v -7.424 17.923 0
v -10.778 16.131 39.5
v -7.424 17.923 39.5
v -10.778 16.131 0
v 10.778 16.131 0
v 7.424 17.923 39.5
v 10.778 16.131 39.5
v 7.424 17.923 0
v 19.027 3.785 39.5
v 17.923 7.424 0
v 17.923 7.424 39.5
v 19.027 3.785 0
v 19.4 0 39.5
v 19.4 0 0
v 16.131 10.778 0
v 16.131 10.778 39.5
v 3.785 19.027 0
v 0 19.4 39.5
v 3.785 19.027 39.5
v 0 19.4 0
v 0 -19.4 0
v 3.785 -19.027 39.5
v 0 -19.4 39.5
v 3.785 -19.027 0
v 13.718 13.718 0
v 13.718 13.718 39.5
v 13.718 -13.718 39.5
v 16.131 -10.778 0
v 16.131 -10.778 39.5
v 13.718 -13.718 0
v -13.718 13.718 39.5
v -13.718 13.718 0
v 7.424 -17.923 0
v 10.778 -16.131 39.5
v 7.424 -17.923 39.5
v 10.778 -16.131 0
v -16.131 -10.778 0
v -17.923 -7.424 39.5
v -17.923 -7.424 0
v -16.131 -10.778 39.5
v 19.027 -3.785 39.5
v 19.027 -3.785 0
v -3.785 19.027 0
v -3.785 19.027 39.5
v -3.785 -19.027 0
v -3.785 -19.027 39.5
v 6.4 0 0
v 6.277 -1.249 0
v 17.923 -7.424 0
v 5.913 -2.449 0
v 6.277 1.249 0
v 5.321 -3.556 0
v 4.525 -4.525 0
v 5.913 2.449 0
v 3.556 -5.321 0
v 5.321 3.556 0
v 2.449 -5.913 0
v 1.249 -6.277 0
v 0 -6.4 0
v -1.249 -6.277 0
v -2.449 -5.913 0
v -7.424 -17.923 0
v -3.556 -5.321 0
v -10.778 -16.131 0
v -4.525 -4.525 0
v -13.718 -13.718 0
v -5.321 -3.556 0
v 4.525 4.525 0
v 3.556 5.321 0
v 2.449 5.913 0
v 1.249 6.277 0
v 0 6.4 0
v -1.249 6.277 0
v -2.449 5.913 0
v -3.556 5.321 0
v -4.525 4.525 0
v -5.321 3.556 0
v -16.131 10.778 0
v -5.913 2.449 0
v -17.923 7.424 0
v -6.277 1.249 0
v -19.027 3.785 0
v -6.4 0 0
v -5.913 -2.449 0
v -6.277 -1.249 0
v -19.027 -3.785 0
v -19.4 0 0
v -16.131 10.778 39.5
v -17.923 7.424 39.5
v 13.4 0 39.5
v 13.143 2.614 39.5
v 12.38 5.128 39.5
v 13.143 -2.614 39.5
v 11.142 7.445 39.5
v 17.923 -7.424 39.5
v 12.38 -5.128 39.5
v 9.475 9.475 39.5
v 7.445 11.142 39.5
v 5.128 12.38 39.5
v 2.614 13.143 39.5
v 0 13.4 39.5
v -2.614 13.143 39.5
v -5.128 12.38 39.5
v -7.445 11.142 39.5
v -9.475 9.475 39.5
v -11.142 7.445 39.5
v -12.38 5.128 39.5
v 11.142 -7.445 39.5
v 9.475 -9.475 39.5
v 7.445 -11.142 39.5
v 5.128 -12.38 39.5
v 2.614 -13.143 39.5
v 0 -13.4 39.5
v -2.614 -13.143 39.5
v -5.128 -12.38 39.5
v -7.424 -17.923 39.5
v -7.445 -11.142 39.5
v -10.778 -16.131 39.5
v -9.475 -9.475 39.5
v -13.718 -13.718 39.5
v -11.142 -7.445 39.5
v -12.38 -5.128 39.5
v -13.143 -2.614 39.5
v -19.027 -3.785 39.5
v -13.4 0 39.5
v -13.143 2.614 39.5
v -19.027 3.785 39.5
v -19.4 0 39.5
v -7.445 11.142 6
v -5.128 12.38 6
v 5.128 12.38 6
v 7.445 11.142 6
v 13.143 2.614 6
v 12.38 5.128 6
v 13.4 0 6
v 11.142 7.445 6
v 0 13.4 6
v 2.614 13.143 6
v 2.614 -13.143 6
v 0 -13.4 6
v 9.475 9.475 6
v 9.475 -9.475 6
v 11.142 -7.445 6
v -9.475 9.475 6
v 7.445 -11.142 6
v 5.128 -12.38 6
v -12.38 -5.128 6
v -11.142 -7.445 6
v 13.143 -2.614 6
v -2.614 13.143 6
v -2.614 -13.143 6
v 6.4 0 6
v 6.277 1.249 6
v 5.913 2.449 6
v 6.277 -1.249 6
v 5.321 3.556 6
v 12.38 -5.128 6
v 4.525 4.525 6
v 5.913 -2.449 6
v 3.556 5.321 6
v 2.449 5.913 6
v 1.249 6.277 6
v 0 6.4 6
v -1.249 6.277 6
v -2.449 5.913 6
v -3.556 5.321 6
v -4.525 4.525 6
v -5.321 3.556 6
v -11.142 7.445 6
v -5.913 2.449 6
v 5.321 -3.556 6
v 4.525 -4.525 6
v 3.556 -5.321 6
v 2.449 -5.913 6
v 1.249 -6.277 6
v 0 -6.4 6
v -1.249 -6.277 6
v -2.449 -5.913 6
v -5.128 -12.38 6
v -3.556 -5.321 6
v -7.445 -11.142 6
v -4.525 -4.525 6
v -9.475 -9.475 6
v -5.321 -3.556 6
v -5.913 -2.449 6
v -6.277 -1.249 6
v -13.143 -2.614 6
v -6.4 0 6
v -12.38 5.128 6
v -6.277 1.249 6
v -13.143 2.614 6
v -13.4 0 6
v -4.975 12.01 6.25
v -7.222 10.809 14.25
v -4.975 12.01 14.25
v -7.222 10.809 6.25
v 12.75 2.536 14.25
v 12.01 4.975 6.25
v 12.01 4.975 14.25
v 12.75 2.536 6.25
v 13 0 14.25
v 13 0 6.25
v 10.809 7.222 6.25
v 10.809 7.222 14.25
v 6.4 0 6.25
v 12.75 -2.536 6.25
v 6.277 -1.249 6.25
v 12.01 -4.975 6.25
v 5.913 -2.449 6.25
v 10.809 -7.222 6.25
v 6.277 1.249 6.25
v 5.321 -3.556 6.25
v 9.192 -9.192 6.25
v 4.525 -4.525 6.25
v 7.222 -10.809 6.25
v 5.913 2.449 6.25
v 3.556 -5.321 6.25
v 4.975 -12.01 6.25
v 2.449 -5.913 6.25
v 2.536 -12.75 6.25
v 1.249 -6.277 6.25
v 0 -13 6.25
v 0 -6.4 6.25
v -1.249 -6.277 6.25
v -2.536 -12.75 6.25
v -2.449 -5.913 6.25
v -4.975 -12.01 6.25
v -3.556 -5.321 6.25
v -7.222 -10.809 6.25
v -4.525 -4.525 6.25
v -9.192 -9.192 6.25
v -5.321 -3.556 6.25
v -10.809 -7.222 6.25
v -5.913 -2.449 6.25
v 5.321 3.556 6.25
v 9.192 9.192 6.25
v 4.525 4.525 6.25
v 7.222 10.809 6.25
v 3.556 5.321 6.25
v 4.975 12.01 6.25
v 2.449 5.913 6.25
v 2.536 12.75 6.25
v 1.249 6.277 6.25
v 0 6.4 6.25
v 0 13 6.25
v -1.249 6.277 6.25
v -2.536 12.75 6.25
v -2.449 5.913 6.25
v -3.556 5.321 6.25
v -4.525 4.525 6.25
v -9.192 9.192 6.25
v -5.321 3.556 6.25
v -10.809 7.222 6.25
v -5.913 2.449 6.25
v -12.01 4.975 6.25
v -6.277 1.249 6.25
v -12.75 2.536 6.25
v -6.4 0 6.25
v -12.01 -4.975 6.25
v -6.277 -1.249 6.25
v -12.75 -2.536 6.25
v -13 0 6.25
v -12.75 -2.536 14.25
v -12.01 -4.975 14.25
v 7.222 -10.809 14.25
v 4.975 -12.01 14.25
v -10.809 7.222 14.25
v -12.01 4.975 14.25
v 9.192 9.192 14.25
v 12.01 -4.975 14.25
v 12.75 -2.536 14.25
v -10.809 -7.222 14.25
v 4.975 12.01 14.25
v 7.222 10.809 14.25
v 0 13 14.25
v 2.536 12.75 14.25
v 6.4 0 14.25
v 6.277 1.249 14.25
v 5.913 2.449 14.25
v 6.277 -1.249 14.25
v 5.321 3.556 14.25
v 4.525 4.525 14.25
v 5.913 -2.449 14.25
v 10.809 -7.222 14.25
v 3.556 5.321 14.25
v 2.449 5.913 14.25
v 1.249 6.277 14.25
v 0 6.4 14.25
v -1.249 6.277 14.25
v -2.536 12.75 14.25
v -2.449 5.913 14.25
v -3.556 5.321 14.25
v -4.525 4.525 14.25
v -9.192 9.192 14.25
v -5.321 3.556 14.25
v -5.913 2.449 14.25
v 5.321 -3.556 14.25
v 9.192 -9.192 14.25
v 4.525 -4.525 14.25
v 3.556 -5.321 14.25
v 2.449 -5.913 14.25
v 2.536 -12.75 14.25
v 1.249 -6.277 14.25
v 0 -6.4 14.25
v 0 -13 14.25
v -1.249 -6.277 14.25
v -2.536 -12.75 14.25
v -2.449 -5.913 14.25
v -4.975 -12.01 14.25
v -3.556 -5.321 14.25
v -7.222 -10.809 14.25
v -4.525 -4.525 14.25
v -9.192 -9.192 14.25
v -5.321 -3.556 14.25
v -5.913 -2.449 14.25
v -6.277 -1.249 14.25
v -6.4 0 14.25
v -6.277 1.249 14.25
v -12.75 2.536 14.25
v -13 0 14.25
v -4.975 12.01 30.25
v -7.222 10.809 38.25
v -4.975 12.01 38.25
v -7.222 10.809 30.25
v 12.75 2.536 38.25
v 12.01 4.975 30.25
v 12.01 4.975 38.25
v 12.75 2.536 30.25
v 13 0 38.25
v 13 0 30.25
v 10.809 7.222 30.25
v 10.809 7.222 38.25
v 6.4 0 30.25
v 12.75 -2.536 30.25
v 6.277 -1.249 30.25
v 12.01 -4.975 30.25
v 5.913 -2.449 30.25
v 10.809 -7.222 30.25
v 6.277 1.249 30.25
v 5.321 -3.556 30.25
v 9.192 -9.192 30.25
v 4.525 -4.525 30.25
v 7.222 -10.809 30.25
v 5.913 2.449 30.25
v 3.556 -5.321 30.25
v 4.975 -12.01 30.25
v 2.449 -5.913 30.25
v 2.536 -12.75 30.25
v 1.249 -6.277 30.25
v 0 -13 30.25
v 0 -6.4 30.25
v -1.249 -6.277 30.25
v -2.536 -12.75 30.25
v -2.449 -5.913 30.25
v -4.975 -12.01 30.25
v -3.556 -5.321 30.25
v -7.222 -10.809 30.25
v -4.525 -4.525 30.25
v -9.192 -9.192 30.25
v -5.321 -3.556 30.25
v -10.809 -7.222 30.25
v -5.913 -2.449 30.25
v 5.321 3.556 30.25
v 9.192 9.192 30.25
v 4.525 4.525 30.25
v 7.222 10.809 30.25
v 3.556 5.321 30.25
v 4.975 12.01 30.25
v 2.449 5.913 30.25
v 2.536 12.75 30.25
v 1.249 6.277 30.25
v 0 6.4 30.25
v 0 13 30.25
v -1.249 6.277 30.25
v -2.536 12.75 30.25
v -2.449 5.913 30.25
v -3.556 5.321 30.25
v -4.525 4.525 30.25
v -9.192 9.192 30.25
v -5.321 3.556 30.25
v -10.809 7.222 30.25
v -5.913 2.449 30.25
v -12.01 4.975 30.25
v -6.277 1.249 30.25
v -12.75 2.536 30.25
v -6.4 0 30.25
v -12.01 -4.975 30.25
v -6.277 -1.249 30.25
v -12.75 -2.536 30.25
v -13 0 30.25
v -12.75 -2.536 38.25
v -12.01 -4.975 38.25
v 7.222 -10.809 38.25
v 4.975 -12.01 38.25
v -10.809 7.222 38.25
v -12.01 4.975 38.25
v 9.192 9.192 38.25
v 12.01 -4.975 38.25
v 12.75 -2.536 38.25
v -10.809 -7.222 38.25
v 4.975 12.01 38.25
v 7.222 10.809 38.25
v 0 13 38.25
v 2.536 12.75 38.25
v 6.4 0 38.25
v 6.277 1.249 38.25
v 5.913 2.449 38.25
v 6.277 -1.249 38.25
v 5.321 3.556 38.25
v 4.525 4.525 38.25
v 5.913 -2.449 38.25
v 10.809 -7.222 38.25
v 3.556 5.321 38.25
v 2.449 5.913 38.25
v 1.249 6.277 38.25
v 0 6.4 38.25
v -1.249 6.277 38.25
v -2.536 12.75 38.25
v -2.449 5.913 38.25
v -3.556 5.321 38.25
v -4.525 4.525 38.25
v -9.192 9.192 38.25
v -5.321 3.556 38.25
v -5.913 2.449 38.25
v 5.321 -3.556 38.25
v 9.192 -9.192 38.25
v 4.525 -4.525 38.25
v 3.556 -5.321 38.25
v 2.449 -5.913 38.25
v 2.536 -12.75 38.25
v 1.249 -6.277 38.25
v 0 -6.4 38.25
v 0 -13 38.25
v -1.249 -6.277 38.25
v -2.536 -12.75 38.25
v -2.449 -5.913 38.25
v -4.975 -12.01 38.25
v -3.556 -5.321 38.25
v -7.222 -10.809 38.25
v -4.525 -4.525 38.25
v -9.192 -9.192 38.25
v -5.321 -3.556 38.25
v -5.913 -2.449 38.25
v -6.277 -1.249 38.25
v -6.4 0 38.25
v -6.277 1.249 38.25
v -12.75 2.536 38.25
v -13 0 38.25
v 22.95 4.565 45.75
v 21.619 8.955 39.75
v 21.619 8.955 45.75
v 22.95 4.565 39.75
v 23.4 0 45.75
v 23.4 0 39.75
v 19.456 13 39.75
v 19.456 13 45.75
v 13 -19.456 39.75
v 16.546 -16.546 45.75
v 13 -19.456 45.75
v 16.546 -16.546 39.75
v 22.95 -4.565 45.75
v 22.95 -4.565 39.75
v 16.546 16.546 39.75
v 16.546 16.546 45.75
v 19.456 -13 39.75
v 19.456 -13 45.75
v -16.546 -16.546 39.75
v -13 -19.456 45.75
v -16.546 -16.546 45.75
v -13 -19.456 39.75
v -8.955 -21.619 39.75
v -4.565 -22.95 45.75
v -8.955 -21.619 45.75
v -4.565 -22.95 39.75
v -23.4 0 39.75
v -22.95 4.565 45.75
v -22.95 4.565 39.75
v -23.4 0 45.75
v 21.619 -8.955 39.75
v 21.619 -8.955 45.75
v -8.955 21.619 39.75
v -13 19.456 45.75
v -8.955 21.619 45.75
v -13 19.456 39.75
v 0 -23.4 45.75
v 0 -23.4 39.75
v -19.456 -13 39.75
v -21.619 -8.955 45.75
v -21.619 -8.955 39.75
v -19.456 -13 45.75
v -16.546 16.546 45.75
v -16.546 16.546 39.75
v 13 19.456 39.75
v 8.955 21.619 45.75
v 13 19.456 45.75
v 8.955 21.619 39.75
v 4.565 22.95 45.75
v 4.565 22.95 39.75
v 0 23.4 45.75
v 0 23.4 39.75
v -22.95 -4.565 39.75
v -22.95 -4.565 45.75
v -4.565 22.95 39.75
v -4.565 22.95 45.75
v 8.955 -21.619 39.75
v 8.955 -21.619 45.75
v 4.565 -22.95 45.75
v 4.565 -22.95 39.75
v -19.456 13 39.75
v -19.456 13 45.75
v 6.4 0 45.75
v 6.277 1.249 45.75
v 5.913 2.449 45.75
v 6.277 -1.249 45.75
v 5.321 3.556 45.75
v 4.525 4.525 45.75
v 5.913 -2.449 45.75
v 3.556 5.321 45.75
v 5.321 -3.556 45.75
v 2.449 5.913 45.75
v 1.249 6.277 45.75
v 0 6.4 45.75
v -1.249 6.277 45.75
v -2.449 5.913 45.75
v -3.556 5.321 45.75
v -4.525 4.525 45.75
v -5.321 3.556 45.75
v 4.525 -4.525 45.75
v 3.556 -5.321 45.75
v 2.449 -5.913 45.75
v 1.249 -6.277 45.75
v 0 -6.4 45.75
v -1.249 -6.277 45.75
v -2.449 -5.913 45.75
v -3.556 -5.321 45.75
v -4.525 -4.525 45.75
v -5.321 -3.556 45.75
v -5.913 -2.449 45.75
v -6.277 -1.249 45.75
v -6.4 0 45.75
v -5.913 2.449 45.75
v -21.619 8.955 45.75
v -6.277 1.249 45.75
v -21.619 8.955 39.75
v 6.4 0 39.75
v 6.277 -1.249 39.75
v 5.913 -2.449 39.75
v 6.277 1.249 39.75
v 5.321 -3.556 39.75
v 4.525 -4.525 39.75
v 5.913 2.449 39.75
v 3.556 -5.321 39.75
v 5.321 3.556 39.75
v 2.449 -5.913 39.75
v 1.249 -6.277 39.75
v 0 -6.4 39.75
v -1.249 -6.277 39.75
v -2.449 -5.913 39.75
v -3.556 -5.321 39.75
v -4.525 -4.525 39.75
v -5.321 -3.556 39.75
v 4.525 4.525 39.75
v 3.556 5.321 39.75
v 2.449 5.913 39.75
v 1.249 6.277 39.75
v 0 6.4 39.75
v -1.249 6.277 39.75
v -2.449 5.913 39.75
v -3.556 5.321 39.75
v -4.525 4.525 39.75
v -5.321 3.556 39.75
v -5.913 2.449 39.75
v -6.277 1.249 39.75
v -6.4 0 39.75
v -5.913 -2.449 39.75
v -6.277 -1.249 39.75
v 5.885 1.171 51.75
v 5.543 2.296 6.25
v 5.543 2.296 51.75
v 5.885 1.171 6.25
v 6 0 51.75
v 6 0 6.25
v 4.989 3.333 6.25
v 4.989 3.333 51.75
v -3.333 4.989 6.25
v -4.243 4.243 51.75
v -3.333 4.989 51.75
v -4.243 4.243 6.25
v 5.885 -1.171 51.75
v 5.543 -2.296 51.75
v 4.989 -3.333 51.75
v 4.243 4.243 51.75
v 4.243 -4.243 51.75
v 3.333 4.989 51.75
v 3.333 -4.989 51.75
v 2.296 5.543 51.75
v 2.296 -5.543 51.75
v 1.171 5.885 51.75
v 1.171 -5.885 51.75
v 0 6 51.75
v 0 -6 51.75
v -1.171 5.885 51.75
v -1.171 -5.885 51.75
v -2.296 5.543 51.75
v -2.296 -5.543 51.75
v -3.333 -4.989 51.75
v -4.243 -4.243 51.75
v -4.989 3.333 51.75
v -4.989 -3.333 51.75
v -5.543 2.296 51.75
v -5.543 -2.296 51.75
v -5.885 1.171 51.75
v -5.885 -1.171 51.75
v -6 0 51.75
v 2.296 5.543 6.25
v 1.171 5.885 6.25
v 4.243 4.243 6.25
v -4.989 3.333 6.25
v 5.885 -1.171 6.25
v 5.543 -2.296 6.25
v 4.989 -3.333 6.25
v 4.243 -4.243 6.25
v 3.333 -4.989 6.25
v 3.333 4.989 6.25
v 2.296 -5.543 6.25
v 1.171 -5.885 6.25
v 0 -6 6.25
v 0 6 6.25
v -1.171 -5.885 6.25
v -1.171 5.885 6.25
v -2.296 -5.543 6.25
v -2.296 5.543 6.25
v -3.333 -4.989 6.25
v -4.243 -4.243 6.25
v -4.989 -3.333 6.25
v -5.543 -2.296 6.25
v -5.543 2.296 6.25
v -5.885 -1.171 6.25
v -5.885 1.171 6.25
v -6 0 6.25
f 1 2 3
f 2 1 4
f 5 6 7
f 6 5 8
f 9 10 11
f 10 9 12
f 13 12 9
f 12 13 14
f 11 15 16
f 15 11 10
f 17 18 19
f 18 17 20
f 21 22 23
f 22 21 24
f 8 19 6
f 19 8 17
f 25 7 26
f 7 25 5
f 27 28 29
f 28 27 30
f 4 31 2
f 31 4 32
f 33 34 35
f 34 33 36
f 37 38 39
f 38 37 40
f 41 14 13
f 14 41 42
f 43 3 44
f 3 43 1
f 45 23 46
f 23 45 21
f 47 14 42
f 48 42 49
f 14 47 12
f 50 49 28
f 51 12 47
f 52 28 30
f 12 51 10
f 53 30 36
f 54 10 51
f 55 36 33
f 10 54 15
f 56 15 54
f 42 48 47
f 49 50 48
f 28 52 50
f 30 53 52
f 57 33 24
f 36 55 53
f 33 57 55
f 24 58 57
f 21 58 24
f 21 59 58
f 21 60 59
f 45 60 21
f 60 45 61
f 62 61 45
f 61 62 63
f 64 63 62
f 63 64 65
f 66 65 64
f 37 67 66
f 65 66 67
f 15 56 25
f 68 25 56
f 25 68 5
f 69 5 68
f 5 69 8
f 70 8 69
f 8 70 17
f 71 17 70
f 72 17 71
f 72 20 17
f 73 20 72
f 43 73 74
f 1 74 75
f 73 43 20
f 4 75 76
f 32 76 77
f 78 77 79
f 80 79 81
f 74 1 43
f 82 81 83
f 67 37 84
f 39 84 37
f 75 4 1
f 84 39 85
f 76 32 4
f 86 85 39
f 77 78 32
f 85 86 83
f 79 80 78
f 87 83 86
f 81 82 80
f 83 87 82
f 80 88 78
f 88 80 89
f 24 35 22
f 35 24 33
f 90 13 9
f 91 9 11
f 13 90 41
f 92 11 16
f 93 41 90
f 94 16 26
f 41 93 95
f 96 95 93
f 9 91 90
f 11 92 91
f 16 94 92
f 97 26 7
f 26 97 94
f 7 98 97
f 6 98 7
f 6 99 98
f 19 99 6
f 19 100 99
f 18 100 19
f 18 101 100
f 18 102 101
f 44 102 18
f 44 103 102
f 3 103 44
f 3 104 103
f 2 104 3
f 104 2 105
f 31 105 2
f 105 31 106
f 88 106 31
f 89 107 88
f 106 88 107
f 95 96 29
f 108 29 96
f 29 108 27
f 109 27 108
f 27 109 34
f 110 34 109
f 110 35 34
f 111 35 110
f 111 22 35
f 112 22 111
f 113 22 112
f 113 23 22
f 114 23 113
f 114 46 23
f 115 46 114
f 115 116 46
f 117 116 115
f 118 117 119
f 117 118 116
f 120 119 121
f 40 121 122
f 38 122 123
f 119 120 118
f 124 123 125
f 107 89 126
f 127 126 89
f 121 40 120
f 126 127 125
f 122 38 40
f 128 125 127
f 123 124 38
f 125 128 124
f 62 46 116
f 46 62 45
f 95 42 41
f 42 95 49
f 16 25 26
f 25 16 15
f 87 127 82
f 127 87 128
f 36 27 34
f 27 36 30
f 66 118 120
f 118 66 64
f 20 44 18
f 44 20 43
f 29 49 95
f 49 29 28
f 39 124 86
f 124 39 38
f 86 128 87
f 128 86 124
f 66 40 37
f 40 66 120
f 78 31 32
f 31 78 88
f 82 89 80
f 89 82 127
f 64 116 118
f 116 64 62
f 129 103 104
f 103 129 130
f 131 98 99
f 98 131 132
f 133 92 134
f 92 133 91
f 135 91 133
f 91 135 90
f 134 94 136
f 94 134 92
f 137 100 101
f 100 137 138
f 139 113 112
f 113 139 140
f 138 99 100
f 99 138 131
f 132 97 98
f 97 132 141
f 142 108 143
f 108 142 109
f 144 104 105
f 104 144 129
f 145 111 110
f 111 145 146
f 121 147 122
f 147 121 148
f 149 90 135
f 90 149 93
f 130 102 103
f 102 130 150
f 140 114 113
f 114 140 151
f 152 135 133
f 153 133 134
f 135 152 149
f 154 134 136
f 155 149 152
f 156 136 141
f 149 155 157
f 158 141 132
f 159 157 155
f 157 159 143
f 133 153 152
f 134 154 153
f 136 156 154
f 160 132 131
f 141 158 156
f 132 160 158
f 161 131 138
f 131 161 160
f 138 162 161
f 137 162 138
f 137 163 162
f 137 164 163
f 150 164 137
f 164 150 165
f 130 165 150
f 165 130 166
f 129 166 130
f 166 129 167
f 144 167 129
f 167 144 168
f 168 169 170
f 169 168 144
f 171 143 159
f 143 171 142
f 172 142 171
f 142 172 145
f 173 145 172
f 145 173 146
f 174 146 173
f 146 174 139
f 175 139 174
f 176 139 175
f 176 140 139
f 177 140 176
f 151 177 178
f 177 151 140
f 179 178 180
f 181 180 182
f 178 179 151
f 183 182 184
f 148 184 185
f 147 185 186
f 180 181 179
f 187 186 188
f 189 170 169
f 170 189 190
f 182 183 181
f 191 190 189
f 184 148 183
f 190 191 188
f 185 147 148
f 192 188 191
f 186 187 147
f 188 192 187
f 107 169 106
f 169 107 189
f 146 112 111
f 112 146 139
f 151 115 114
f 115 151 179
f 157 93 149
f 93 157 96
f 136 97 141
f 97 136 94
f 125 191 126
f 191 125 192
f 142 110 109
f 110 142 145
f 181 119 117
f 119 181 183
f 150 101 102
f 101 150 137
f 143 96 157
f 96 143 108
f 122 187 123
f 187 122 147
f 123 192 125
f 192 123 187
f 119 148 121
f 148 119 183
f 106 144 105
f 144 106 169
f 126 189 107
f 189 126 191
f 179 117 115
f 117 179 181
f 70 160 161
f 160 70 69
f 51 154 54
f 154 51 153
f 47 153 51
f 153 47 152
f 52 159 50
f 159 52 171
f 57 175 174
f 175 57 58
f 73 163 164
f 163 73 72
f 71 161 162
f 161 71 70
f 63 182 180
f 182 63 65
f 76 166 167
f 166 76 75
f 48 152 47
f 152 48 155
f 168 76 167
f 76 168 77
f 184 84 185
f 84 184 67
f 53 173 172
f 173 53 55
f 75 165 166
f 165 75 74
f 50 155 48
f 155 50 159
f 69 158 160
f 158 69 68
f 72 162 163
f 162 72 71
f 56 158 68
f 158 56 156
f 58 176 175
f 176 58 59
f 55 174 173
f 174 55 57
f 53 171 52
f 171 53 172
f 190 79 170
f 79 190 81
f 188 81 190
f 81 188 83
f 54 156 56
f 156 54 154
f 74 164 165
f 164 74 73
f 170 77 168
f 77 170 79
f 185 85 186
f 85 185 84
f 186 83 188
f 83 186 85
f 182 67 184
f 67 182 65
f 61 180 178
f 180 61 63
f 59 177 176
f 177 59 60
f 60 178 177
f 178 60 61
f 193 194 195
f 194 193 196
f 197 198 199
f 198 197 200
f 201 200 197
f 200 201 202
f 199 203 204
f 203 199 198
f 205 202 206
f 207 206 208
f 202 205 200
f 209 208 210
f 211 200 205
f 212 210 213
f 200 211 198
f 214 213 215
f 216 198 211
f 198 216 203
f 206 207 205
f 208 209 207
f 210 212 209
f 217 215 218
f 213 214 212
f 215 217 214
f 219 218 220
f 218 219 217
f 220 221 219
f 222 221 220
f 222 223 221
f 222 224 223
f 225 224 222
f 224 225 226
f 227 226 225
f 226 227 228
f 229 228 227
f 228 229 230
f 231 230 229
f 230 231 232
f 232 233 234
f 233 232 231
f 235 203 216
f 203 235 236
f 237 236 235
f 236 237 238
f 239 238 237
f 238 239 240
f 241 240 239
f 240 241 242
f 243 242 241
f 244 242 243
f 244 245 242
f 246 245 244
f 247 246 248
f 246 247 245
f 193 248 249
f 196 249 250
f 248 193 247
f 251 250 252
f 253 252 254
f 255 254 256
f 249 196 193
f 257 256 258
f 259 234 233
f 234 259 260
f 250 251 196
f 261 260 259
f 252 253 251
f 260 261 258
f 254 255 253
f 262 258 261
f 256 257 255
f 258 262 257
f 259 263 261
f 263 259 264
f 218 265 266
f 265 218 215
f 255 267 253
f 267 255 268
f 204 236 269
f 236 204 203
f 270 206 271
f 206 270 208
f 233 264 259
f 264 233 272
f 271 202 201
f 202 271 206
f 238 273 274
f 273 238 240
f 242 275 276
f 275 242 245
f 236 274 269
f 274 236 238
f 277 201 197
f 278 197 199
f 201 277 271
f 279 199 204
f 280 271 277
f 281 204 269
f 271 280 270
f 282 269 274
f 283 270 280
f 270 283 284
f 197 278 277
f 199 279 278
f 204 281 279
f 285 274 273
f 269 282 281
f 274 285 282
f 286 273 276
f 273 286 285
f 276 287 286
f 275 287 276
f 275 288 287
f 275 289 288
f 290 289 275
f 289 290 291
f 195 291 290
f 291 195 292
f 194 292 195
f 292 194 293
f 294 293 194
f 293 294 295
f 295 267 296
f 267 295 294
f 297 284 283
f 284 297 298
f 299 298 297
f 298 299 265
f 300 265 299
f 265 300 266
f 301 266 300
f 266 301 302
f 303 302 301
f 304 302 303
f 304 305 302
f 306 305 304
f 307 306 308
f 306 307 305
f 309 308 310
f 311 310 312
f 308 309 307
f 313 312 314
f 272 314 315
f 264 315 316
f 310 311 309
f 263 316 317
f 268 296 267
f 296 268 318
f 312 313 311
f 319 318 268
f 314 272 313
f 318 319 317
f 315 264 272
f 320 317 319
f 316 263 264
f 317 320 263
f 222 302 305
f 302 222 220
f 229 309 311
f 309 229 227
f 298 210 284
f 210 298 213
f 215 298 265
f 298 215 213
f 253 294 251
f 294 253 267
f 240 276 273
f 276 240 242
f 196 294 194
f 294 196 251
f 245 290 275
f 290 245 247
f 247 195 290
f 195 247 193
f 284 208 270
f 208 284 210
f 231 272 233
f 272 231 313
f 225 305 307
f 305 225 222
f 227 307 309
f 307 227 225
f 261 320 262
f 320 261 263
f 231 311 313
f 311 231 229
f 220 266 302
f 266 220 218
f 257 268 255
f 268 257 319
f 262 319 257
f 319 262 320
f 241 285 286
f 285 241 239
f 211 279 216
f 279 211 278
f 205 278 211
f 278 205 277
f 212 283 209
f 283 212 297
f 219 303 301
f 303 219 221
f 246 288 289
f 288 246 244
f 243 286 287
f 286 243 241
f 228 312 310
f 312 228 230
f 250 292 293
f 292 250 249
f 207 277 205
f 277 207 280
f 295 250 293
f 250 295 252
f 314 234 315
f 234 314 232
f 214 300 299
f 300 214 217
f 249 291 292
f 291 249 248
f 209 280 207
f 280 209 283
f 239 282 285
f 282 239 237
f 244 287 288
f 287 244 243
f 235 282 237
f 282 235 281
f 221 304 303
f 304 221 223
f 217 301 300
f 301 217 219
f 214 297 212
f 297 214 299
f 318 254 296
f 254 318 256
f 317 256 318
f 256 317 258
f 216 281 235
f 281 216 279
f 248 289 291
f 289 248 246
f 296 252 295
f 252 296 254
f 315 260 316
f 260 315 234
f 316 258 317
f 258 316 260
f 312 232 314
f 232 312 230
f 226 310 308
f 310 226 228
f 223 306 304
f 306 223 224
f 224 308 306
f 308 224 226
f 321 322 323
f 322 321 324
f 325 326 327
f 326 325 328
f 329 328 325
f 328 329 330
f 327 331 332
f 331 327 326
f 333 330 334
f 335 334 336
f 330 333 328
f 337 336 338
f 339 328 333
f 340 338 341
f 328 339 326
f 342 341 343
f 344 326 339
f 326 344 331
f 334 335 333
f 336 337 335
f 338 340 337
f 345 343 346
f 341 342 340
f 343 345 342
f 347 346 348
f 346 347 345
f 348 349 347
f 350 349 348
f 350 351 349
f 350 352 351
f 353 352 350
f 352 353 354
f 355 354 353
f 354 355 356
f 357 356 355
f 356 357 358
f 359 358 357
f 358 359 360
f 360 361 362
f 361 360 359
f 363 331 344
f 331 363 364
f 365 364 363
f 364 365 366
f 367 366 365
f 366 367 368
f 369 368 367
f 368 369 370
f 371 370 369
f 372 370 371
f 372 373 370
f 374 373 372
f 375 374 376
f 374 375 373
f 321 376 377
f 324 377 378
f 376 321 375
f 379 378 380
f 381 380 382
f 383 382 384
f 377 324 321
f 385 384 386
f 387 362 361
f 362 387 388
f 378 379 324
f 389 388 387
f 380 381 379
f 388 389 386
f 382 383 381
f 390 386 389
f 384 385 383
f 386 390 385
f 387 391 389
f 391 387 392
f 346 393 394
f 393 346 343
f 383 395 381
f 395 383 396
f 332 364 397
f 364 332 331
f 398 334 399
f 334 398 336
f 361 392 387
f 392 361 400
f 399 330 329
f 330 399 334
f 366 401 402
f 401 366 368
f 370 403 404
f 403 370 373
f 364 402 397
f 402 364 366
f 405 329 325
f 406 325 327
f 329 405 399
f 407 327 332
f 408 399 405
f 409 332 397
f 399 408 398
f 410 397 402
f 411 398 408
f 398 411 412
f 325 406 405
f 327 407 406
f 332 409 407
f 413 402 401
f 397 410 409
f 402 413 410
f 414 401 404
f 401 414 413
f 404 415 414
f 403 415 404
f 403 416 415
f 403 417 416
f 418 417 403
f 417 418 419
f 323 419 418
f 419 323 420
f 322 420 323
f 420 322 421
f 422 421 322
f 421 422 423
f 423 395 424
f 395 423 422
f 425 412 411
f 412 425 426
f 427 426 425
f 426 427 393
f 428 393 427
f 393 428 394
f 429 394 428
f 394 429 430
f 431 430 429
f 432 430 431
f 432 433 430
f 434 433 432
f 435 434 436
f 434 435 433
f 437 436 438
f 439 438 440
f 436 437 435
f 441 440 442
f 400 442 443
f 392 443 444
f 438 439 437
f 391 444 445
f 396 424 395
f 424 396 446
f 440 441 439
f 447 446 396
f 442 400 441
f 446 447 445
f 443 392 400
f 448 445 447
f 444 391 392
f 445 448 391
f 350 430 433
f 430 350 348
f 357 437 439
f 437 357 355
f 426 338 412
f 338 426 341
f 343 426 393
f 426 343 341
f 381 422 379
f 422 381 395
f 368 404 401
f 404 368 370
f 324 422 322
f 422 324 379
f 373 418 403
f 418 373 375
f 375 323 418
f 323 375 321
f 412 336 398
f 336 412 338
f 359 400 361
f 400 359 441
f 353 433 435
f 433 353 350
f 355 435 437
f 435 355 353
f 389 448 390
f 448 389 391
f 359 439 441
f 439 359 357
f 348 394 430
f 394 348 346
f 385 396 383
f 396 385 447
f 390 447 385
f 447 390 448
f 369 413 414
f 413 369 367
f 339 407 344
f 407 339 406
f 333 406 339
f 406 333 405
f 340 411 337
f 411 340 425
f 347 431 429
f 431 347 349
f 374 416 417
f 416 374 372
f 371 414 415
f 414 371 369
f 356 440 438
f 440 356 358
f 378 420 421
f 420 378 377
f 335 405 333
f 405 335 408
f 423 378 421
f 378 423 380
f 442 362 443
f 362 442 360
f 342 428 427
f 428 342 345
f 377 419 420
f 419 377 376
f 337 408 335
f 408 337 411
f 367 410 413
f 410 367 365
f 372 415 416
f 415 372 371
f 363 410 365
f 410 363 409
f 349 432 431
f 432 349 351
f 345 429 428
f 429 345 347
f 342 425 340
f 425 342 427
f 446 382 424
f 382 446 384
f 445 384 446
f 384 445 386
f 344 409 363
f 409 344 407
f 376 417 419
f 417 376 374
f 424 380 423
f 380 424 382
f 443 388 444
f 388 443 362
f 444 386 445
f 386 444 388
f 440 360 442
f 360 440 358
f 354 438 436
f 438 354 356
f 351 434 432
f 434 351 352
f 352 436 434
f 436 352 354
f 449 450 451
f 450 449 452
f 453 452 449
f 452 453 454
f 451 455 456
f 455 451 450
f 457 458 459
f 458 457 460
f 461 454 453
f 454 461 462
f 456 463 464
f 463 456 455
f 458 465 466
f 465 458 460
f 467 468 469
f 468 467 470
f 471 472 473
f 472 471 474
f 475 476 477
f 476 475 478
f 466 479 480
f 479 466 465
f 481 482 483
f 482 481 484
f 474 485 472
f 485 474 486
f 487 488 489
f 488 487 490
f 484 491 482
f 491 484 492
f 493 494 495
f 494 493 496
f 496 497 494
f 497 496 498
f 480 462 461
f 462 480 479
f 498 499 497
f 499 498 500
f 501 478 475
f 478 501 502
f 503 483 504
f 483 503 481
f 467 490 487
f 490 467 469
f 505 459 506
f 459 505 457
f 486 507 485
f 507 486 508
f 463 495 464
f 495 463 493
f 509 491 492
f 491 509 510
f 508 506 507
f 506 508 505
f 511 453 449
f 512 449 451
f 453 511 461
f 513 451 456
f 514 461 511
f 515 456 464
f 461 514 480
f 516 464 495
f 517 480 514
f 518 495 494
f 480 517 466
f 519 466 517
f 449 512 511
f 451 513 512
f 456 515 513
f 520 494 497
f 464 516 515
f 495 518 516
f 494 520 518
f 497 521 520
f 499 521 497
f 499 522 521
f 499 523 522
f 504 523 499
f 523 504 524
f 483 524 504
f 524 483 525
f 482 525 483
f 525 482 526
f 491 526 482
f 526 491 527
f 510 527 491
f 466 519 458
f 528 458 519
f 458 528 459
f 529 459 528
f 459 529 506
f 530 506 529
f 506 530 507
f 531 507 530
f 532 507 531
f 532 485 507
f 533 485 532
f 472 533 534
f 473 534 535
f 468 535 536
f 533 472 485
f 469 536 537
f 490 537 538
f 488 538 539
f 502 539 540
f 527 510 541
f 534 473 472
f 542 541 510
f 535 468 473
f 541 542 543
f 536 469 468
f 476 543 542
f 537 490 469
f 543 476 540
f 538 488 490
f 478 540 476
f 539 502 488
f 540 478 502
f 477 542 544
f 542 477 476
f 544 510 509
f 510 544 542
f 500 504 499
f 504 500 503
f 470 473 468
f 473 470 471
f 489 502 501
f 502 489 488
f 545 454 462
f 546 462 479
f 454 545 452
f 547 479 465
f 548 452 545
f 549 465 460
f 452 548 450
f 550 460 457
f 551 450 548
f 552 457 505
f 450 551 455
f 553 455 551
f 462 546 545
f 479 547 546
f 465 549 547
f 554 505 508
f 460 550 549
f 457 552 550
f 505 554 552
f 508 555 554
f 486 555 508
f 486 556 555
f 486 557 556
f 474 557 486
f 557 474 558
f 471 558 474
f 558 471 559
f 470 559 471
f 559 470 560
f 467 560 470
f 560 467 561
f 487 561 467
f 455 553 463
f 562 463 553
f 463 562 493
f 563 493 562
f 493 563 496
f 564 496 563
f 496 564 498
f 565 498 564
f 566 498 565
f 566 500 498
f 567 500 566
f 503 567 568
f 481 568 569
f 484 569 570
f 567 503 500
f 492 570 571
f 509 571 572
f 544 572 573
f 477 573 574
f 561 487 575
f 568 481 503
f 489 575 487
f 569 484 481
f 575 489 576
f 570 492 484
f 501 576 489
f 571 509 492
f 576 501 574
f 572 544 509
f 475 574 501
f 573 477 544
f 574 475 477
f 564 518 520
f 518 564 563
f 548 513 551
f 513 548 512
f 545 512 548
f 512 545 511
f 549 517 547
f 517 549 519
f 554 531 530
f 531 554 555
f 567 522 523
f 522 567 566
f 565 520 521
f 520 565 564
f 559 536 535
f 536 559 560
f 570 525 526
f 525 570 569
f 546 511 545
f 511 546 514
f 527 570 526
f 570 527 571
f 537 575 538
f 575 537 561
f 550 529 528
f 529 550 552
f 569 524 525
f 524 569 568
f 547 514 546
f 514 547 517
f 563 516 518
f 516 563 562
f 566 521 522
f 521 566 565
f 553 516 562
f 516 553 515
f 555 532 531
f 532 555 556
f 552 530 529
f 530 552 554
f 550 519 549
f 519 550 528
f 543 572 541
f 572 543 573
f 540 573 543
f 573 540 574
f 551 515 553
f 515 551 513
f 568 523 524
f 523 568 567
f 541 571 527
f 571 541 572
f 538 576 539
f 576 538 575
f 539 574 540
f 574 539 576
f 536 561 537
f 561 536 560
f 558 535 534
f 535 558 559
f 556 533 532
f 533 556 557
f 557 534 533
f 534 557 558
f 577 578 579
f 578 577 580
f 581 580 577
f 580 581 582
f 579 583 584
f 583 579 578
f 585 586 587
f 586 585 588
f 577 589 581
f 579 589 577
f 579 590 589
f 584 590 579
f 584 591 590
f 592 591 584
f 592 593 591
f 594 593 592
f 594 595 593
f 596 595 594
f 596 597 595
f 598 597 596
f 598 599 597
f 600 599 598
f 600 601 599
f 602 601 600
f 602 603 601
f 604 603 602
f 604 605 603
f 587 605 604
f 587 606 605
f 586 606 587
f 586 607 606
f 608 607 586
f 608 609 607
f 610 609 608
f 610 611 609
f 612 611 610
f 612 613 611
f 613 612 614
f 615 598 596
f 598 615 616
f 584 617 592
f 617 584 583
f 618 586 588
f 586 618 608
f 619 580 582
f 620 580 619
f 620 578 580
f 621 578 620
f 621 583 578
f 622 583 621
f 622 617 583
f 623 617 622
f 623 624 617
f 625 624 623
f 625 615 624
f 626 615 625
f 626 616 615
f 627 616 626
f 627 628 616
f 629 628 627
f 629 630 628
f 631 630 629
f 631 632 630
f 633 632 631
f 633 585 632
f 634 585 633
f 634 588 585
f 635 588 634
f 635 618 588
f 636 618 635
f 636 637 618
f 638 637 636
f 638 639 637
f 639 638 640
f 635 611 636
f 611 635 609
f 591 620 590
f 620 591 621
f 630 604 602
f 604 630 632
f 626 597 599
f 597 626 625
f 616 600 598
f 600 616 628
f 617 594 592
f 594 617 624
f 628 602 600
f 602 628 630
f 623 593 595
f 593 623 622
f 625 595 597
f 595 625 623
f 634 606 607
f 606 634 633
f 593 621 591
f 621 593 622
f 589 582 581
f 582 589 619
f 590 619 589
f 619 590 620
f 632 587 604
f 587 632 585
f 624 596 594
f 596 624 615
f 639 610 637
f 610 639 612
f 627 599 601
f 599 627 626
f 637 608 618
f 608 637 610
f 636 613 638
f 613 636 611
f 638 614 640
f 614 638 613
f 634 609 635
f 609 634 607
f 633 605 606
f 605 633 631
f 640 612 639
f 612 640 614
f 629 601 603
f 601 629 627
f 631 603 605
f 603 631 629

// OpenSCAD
$fn = 32;

// ------------------------------------------------------------------------
// Shaft station: cup d38.8 x 39.5 mm, shaft d12
// Every part is its own module, assembly() places every instance.
// ------------------------------------------------------------------------

// --- part 1 ---
module housing_cup() {
  difference() {
    cylinder(h = 39.5, d = 38.8);
    translate([0, 0, 6]) cylinder(h = 34.5, d = 26.8);
    translate([0, 0, -1]) cylinder(h = 8, d = 12.8);
  }
}

// --- part 2 ---
module bearing_lower() {
  difference() {
      translate([0, 0, 0]) cylinder(h = 8, d = 26);
      translate([0, 0, -1]) cylinder(h = 10, d = 12.8);
    }
}

// --- part 3 ---
module bearing_upper() {
  difference() {
      translate([0, 0, 0]) cylinder(h = 8, d = 26);
      translate([0, 0, -1]) cylinder(h = 10, d = 12.8);
    }
}

// --- part 4 ---
module station_shaft() {
  translate([0, 0, -22.75]) cylinder(h = 45.5, d = 12);
}

// --- part 5 ---
module station_cover() {
  difference() {
    cylinder(h = 6, d = 46.8);
    translate([0, 0, -1]) cylinder(h = 8, d = 12.8);
  }
}

// --- assembly ---
module assembly() {
  color([0.80, 0.24, 0.20]) translate([0, 0, 0]) rotate([0, 0, 0]) housing_cup();
  color([0.20, 0.45, 0.75]) translate([0, 0, 6.25]) rotate([0, 0, 0]) bearing_lower();
  color([0.25, 0.62, 0.32]) translate([0, 0, 30.25]) rotate([0, 0, 0]) bearing_upper();
  color([0.92, 0.70, 0.18]) translate([0, 0, 29]) rotate([0, 0, 0]) station_shaft();
  color([0.58, 0.35, 0.70]) translate([0, 0, 39.75]) rotate([0, 0, 0]) station_cover();
}

assembly();
